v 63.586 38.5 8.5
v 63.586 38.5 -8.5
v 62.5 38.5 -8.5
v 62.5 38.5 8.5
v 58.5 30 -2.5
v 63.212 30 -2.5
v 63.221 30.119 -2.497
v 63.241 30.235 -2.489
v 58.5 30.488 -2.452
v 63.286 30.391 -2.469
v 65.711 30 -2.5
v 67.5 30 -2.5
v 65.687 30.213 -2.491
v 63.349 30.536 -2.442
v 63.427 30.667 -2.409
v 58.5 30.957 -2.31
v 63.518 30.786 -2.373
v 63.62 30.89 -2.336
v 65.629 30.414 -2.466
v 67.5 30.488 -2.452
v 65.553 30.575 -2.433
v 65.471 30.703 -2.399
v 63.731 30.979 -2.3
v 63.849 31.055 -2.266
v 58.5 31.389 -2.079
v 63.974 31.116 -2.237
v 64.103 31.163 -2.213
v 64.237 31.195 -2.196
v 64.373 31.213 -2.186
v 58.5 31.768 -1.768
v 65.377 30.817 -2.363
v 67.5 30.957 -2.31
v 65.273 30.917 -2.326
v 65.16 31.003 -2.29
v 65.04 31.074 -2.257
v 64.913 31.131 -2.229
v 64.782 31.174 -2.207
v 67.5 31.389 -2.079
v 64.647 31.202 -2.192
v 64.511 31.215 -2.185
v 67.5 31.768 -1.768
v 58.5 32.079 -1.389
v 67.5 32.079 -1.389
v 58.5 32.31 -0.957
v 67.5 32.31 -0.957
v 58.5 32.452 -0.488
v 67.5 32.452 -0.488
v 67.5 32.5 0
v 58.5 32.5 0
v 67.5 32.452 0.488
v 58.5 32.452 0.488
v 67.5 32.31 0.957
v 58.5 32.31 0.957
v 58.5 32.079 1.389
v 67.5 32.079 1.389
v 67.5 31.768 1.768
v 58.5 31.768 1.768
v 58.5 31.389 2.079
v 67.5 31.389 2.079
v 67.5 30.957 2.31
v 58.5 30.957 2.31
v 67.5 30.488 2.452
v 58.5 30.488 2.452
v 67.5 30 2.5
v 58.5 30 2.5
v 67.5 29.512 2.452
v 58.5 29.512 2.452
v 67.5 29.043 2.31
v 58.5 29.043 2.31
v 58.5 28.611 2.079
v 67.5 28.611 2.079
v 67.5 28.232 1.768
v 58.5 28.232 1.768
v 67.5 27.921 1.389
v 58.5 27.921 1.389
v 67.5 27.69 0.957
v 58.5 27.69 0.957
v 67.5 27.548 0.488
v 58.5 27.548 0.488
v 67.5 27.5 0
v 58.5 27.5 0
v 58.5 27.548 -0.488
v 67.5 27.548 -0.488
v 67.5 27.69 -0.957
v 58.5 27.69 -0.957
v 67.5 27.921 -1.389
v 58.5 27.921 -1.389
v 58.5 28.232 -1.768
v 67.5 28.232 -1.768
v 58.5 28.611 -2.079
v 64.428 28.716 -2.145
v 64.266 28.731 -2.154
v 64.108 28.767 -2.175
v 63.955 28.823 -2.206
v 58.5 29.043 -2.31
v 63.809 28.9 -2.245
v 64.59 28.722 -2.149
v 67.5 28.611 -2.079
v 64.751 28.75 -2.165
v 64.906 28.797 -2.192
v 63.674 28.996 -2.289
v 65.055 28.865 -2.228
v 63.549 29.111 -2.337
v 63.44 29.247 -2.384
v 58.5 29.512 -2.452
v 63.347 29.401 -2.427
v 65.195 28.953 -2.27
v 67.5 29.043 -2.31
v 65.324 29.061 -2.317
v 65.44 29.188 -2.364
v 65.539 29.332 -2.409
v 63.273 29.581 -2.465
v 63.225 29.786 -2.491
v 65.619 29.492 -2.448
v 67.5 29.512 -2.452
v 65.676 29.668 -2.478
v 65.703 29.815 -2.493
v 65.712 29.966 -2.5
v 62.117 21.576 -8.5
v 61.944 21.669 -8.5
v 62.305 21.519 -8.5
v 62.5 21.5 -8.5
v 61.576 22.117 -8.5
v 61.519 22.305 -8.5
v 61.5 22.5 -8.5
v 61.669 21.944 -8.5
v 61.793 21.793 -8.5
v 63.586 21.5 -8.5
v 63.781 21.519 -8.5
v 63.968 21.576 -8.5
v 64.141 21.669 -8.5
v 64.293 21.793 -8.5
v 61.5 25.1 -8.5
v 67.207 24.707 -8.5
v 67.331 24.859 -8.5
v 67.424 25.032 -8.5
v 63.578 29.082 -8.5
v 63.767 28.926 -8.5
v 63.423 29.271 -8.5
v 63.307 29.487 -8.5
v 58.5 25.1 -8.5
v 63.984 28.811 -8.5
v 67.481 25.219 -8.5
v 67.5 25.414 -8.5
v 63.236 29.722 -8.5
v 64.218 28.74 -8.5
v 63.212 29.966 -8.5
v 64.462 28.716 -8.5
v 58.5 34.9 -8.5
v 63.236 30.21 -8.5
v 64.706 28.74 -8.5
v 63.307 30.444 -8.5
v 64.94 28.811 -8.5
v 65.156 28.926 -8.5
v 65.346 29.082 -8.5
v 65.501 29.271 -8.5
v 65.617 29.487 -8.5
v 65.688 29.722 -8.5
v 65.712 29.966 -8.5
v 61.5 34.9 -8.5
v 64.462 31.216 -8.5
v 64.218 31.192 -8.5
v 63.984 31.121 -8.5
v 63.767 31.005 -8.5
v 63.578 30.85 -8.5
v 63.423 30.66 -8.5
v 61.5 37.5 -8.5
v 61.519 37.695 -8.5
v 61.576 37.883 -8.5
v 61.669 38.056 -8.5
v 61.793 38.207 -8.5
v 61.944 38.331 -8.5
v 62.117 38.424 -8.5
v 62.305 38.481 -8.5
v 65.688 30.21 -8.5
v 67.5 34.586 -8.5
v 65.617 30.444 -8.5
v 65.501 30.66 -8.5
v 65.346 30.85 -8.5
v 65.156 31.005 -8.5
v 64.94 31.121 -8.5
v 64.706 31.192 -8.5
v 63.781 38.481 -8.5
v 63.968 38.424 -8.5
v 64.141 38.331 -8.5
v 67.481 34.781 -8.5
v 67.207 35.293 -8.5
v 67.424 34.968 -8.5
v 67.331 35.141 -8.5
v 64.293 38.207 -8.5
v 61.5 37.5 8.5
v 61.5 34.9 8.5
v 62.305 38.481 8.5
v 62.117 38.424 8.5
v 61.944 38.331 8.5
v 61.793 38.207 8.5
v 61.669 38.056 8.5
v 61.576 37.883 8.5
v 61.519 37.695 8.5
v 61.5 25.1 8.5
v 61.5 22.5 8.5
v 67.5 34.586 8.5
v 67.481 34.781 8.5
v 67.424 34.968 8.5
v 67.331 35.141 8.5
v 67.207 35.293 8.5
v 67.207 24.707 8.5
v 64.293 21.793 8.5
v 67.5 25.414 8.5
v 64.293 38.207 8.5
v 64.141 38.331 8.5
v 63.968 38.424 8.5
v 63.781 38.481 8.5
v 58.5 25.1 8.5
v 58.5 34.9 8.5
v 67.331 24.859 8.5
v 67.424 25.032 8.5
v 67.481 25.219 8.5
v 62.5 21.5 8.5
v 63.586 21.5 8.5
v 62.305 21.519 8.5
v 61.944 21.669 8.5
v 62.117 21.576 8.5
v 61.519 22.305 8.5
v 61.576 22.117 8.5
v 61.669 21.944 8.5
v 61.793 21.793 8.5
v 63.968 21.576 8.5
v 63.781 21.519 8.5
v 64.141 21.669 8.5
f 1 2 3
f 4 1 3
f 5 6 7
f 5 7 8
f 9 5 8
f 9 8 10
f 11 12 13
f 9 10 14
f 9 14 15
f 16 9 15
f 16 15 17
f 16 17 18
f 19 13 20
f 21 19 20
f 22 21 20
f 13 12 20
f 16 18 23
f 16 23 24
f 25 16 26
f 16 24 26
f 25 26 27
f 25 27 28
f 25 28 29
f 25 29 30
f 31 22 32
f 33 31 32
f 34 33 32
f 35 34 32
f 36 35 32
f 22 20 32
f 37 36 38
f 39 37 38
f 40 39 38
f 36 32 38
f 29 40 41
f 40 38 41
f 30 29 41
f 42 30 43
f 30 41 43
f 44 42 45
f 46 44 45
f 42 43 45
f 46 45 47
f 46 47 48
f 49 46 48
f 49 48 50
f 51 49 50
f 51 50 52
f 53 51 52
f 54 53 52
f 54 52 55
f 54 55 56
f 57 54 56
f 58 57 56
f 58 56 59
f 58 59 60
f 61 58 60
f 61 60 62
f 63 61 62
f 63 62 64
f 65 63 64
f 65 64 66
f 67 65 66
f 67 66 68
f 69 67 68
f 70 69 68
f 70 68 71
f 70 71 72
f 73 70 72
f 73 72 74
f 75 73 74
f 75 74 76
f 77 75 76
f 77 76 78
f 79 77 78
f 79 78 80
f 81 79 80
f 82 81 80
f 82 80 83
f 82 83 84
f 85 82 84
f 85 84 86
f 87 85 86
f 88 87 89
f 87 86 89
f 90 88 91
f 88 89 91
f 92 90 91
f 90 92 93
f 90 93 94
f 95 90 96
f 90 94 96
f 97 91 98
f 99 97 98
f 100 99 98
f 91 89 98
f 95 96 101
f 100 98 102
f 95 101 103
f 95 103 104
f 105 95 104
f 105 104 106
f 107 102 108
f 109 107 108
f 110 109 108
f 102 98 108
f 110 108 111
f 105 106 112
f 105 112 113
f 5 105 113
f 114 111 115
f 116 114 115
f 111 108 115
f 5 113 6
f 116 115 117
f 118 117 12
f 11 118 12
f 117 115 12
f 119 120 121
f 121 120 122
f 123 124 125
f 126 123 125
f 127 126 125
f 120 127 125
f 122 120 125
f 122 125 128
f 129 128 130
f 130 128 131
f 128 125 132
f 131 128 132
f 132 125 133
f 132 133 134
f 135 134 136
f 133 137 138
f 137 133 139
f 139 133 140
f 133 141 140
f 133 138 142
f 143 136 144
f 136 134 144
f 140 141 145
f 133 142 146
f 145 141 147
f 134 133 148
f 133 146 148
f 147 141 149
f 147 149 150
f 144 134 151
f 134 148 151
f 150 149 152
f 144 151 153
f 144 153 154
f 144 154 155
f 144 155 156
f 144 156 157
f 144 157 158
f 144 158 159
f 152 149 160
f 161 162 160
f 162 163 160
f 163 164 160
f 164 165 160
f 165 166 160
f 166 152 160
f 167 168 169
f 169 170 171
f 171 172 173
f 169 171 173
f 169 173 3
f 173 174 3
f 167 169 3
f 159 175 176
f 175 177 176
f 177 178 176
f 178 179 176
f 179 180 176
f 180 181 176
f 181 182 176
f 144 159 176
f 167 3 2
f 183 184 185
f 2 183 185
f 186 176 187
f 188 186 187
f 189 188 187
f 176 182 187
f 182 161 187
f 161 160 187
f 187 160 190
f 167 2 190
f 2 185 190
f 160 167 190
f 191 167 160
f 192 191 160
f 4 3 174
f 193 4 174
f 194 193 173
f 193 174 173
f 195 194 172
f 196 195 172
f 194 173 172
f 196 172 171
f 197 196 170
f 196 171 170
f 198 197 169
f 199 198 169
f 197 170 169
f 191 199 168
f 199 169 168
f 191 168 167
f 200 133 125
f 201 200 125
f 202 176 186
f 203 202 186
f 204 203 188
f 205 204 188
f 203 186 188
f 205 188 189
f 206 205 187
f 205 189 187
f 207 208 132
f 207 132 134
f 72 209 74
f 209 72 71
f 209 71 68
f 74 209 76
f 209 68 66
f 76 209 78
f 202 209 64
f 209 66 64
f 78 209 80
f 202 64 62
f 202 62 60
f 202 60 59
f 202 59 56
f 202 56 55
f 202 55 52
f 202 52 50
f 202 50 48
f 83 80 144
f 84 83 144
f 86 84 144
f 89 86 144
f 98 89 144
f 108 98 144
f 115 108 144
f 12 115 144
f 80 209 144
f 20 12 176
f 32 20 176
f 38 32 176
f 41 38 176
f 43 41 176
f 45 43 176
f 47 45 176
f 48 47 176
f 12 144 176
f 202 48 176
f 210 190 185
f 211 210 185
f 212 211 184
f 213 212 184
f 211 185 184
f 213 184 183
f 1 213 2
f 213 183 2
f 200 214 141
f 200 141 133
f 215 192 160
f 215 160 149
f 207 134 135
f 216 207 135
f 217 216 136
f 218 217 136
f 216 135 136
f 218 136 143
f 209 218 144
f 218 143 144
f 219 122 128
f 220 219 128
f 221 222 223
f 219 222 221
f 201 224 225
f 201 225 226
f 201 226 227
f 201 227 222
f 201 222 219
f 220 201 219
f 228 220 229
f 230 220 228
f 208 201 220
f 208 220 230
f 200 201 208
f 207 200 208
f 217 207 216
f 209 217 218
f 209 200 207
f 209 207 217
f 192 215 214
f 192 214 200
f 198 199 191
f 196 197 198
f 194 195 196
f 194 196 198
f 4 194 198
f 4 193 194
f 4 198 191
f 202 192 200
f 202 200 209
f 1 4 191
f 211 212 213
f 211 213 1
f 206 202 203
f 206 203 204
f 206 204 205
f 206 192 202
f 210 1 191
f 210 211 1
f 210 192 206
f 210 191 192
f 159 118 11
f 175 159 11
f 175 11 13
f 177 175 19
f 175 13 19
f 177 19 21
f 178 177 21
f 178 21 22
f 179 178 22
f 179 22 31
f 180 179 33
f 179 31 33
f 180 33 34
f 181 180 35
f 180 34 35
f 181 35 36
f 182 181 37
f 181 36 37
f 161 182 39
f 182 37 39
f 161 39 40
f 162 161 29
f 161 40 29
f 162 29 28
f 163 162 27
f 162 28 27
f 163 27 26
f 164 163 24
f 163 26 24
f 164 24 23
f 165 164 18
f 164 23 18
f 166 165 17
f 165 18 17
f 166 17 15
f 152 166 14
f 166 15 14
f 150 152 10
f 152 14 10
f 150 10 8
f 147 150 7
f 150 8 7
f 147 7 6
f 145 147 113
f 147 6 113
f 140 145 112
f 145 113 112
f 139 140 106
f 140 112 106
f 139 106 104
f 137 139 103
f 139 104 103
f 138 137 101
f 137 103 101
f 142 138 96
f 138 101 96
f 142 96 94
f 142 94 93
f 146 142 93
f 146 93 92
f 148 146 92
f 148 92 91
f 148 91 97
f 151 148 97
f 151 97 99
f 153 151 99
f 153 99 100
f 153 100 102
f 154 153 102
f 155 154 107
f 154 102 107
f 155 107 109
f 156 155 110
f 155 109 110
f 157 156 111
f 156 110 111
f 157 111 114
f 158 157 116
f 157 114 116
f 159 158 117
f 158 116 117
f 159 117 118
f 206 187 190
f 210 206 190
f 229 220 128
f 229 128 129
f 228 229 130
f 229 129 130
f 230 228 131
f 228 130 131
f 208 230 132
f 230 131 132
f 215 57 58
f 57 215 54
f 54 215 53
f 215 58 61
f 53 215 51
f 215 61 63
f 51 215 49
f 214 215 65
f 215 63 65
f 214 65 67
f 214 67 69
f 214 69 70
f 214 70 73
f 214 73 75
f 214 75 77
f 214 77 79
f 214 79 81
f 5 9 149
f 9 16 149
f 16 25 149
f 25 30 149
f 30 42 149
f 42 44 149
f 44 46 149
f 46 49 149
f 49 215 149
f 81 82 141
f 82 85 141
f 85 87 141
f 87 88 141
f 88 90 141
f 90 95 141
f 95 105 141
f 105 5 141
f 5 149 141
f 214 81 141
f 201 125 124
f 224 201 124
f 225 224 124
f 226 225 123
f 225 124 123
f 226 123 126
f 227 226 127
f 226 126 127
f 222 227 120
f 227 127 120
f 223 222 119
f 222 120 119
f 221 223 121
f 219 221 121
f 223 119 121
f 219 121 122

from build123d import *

# Parameters (mm, degrees)
BOSS_EXTRUDE2_DEPTH       = 8.5
BOSS_EXTRUDE2_DEPTH_BACK  = 8.5
M6_TAPPED_HOLE1_D         = 5
M3X0_5_TAPPED_HOLE1_D     = 2.5
M3X0_5_TAPPED_HOLE1_DEPTH = 7.5
M3X0_5_TAPPED_HOLE1_TIP   = 0.751075774


with BuildPart() as part:
    # Model → Boss-Extrude2 (new, two sides: drawn at the far end of the back side and taken through both)
    with BuildSketch(Plane.XY.offset(-BOSS_EXTRUDE2_DEPTH_BACK)):
        with BuildLine():
            Line((64.292892272, 21.792891862), (67.207107272, 24.707105862))
            ThreePointArc((67.207107272, 24.707105862), (67.423880138, 25.031529799), (67.500000272, 25.414213862))
            Line((67.500000272, 25.414213862), (67.500000272, 34.5857853))
            ThreePointArc((67.500000272, 34.5857853), (67.423879863, 34.968468589), (67.207107272, 35.292891862))
            Line((67.207107272, 35.292891862), (64.292892272, 38.207106862))
            ThreePointArc((64.292892272, 38.207106862), (63.96846972, 38.423879155), (63.585787272, 38.499999862))
            Line((63.585787272, 38.499999862), (62.500000272, 38.499999862))
            ThreePointArc((62.500000272, 38.499999862), (61.79289349, 38.207106644), (61.500000272, 37.499999862))
            Line((61.500000272, 37.499999862), (61.500000272, 34.899999862))
            Line((61.500000272, 34.899999862), (58.500000272, 34.899999862))
            Line((58.500000272, 34.899999862), (58.500000272, 25.099999862))
            Line((58.500000272, 25.099999862), (61.500000272, 25.099999862))
            Line((61.500000272, 25.099999862), (61.500000272, 22.499999862))
            ThreePointArc((61.500000272, 22.499999862), (61.79289349, 21.792893081), (62.500000272, 21.499999862))
            Line((62.500000272, 21.499999862), (63.585787272, 21.499999862))
            ThreePointArc((63.585787272, 21.499999862), (63.968469605, 21.576120108), (64.292892272, 21.792891862))
        make_face()
    extrude(amount=BOSS_EXTRUDE2_DEPTH + BOSS_EXTRUDE2_DEPTH_BACK)

    # M6 Tapped Hole1 (through all)
    with Locations(Plane.ZY.offset(-58.500000272)):
        with Locations((0, 29.999999862)):
            Hole(M6_TAPPED_HOLE1_D / 2)

    # M3x0.5 Tapped Hole1
    with Locations(Plane(origin=(0, 0, -8.5), x_dir=(-1, 0, 0), z_dir=(0, 0, -1))):
        with Locations((-64.461940205, 29.965764831)):
            Hole(M3X0_5_TAPPED_HOLE1_D / 2, depth=M3X0_5_TAPPED_HOLE1_DEPTH)
            with Locations((0, 0, -(M3X0_5_TAPPED_HOLE1_DEPTH + M3X0_5_TAPPED_HOLE1_TIP / 2))):  # 118° drill point
                Cone(0, M3X0_5_TAPPED_HOLE1_D / 2, M3X0_5_TAPPED_HOLE1_TIP, mode=Mode.SUBTRACT)


solid = part.part
